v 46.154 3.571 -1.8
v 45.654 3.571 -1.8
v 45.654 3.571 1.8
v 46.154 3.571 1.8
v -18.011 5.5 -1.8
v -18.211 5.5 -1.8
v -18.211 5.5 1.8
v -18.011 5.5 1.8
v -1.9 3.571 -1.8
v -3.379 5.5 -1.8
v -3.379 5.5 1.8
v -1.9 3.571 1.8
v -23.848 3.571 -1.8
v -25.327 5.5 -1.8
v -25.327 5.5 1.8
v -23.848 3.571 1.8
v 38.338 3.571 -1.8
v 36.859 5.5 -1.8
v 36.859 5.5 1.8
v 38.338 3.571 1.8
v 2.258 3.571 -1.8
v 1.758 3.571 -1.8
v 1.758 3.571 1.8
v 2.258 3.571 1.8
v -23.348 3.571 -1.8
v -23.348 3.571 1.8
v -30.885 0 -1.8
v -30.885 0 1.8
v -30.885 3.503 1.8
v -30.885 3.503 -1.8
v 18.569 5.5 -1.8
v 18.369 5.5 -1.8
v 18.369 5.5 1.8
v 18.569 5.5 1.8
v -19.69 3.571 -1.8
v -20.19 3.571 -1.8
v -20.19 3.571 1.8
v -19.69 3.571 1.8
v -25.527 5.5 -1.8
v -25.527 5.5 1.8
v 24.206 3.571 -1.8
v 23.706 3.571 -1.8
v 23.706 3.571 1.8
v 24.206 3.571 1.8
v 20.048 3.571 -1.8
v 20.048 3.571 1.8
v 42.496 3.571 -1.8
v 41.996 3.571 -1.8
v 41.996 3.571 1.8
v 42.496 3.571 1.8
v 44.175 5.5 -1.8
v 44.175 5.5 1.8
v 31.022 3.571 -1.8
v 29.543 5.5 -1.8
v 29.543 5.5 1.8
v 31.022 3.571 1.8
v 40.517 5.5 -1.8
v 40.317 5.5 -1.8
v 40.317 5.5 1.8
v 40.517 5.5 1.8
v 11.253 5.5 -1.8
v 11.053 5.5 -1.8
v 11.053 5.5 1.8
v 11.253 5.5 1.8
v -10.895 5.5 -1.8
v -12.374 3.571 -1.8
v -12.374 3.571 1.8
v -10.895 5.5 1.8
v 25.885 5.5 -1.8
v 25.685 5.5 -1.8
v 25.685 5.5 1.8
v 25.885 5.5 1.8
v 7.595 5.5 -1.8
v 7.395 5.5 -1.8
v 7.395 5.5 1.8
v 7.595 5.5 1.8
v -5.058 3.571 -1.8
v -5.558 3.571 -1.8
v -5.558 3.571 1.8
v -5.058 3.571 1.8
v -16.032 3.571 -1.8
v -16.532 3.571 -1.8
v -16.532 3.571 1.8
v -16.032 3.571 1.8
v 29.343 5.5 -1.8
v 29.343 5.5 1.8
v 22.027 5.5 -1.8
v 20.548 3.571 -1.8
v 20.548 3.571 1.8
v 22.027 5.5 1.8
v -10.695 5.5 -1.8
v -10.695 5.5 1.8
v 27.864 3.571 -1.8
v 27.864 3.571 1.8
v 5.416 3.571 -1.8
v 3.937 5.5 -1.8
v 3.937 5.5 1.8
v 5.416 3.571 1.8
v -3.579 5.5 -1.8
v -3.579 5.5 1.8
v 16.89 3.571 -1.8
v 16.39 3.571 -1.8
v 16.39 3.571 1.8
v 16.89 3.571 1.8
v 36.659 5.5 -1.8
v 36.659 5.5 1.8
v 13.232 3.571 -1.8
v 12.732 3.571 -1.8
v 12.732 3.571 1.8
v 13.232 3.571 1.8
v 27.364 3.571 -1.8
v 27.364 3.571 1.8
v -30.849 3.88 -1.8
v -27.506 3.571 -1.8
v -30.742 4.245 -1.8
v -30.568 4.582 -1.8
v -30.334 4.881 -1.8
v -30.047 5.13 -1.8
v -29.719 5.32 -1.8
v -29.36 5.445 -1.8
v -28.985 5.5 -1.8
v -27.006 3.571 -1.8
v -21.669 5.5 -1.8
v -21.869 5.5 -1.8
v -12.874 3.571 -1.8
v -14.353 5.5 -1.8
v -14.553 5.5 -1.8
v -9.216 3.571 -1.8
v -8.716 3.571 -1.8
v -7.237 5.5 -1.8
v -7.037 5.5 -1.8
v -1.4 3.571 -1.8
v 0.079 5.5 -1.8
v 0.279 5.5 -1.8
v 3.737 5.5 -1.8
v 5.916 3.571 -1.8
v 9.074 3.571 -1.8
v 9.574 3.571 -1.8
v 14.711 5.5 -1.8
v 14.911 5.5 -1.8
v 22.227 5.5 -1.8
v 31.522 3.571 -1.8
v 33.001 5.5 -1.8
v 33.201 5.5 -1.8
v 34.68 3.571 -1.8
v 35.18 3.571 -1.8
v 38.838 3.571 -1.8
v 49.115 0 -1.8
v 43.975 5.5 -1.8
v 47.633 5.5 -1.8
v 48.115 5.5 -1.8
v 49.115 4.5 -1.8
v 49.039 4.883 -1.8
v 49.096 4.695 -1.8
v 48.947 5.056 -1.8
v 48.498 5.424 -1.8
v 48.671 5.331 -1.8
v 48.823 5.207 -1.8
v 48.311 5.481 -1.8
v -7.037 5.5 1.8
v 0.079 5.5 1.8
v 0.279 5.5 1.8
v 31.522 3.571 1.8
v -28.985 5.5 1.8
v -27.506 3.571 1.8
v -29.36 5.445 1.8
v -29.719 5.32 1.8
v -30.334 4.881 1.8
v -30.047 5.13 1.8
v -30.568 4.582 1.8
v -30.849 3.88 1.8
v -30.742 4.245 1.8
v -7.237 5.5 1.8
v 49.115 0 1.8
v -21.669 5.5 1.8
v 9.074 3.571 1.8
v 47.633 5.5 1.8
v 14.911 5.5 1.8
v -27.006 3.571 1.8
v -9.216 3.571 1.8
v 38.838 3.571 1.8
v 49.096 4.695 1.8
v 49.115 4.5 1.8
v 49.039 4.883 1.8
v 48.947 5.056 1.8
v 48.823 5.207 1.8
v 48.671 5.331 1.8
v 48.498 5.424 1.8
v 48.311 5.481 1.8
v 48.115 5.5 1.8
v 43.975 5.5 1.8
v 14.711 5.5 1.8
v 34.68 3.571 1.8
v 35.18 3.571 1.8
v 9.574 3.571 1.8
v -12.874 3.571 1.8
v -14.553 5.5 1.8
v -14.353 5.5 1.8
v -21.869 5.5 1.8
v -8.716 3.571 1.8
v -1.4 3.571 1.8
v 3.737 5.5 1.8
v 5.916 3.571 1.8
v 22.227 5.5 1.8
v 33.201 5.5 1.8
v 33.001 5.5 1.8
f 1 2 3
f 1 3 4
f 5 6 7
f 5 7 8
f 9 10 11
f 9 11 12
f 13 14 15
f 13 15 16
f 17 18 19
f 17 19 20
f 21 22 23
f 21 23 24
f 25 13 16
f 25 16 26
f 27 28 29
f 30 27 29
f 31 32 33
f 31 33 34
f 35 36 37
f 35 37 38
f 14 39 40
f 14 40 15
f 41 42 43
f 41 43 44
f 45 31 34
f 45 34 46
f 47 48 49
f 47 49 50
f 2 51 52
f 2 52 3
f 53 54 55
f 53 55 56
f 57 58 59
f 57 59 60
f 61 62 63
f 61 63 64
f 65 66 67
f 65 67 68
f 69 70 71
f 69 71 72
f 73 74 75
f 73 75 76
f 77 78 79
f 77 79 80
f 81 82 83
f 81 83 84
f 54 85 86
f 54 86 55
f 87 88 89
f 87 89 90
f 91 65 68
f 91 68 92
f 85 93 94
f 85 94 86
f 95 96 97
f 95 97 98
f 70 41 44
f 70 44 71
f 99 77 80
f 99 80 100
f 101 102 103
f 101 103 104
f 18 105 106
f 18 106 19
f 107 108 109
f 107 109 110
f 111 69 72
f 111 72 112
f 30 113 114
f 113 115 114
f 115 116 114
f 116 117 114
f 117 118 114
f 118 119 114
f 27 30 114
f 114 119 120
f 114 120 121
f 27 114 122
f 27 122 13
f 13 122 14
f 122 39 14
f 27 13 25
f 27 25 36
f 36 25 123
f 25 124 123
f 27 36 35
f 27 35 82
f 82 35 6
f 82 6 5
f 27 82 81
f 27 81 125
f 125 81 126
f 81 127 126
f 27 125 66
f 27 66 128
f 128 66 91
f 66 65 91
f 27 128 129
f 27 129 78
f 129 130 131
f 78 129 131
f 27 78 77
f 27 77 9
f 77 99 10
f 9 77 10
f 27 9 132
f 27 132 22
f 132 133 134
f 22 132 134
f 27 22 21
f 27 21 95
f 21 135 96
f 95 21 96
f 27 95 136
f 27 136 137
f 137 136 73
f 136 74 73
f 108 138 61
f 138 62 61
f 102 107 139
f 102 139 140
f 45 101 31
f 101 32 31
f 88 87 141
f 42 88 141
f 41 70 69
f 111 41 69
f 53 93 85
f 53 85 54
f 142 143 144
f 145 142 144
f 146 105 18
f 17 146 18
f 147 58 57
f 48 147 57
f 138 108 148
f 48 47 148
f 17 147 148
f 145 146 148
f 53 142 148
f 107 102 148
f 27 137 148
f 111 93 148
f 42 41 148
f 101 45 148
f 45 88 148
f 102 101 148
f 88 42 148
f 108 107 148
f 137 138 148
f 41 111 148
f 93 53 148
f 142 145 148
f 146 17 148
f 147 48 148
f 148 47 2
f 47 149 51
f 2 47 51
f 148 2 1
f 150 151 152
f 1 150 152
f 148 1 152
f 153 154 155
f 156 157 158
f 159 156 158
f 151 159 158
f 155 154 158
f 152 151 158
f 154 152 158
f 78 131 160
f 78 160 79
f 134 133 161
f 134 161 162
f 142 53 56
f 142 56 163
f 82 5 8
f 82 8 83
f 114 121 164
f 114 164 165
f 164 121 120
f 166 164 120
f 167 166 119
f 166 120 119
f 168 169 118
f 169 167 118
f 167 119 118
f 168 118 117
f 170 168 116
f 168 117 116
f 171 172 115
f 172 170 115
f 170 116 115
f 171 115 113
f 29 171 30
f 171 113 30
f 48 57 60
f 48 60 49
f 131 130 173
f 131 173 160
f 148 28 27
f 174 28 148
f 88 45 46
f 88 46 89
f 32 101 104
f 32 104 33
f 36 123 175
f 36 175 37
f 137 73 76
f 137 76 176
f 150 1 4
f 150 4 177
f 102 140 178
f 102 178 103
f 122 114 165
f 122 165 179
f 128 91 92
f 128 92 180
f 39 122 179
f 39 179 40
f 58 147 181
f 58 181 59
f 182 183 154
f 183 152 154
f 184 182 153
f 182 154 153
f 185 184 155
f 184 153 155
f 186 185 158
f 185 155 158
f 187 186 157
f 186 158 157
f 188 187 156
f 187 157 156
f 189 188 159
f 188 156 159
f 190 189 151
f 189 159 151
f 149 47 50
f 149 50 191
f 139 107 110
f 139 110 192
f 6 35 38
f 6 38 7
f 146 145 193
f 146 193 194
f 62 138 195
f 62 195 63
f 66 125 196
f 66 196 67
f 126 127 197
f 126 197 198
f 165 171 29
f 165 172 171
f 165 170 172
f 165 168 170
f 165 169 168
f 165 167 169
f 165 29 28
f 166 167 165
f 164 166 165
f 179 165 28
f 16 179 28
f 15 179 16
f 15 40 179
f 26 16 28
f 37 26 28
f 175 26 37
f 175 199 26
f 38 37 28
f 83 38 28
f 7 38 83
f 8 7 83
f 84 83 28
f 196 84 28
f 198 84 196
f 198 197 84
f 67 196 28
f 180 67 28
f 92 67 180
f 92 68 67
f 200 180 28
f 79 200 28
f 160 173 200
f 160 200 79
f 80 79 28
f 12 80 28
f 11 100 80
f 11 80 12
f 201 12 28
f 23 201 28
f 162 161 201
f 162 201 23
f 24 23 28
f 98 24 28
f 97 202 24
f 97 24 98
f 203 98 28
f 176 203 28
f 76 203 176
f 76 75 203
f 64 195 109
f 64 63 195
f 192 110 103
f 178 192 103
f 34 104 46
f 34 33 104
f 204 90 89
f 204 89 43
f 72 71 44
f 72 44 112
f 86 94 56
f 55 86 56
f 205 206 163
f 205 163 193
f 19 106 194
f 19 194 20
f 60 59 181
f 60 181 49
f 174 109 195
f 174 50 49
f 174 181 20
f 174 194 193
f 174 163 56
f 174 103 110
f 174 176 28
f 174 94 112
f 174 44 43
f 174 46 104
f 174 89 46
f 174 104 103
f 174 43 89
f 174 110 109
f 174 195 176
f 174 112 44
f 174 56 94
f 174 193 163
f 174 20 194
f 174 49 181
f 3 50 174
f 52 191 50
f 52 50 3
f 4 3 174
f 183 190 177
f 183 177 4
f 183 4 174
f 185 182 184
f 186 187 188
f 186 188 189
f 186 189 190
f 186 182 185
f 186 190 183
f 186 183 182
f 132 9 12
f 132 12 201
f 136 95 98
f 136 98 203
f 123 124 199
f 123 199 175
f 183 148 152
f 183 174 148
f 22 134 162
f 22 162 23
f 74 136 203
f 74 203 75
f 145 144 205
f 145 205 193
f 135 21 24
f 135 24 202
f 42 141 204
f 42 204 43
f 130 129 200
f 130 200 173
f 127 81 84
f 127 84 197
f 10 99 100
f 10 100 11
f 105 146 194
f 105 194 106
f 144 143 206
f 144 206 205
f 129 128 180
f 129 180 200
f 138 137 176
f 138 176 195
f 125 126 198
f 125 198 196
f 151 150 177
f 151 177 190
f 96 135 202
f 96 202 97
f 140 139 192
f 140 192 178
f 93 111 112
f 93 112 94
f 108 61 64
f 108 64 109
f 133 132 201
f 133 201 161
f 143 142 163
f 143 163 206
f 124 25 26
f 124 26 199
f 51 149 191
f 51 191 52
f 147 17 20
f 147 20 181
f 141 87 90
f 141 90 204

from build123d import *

# Parameters (mm, degrees)
SKIZZE1_W                       = 80
SKIZZE1_H                       = 5.5
KOERPER_DEPTH                   = 1.8
SCHNITT_LINEAR_AUSTRAGEN1_DEPTH = 50.553348274
LINEARES_MUSTER10_COUNT         = 21
LINEARES_MUSTER10_PITCH         = 3.658
VERRUNDUNG1_R                   = 2
VERRUNDUNG2_R                   = 1


with BuildPart() as part:
    # Skizze1 → Koerper (new, symmetric)
    with BuildSketch(Plane.XY):
        with Locations((9.115418405, 2.75)):
            Rectangle(SKIZZE1_W, SKIZZE1_H)
    extrude(amount=KOERPER_DEPTH, both=True)

    # kerbe → Schnitt-Linear austragen1 (cut, symmetric)
    with BuildSketch(Plane.XY.offset(1.8)):
        Polygon((-195.870933041, 5.5), (-29.084581595, 5.5), (-28.984581595, 5.5), (-27.505581595, 3.57116725), (-27.005581595, 3.57116725), (-25.526581595, 5.5), (-25.426581595, 5.5), (141.359769852, 5.5), (141.359769852, 339.072702894), (-195.870933041, 339.072702894), align=None)
    schnitt_linear_austragen1 = extrude(amount=SCHNITT_LINEAR_AUSTRAGEN1_DEPTH, both=True, mode=Mode.SUBTRACT)

    # Lineares Muster10: Schnitt-Linear austragen1 ×21
    with Locations(*[(i * LINEARES_MUSTER10_PITCH, 0, 0) for i in range(1, LINEARES_MUSTER10_COUNT)]):
        add(schnitt_linear_austragen1, mode=Mode.SUBTRACT)

    # Verrundung1
    # the kernel refuses this fillet: 2 mm, written as the material it takes off along each edge
    with BuildSketch(Plane(origin=(-30.884581595, 5.5, -6.793746089), x_dir=(1, 0, 0), z_dir=(0, 0, 1))) as verrundung1_piece_1:
        with BuildLine():
            CenterArc((2, -1.997498436), VERRUNDUNG1_R, 92.865983983, 87.134016017)
            Line((0, -1.997498436), (-0.04, -1.997498436))
            Line((-0.04, -1.997498436), (-0.04, 0))
            Line((-0.04, 0), (0, 0.04))
            ThreePointArc((0, 0.04), (0.95, 0.04), (1.898, 0.039949969))
            Line((1.898, 0.039949969), (1.9, 0))
        make_face()
    extrude(amount=13.587492178, mode=Mode.SUBTRACT)

    # Verrundung2
    verrundung2_edges = [part.edges().sort_by_distance(p)[0] for p in [
        (49.115418405, 5.5, 0),
    ]]
    fillet(verrundung2_edges, radius=VERRUNDUNG2_R)


solid = part.part
